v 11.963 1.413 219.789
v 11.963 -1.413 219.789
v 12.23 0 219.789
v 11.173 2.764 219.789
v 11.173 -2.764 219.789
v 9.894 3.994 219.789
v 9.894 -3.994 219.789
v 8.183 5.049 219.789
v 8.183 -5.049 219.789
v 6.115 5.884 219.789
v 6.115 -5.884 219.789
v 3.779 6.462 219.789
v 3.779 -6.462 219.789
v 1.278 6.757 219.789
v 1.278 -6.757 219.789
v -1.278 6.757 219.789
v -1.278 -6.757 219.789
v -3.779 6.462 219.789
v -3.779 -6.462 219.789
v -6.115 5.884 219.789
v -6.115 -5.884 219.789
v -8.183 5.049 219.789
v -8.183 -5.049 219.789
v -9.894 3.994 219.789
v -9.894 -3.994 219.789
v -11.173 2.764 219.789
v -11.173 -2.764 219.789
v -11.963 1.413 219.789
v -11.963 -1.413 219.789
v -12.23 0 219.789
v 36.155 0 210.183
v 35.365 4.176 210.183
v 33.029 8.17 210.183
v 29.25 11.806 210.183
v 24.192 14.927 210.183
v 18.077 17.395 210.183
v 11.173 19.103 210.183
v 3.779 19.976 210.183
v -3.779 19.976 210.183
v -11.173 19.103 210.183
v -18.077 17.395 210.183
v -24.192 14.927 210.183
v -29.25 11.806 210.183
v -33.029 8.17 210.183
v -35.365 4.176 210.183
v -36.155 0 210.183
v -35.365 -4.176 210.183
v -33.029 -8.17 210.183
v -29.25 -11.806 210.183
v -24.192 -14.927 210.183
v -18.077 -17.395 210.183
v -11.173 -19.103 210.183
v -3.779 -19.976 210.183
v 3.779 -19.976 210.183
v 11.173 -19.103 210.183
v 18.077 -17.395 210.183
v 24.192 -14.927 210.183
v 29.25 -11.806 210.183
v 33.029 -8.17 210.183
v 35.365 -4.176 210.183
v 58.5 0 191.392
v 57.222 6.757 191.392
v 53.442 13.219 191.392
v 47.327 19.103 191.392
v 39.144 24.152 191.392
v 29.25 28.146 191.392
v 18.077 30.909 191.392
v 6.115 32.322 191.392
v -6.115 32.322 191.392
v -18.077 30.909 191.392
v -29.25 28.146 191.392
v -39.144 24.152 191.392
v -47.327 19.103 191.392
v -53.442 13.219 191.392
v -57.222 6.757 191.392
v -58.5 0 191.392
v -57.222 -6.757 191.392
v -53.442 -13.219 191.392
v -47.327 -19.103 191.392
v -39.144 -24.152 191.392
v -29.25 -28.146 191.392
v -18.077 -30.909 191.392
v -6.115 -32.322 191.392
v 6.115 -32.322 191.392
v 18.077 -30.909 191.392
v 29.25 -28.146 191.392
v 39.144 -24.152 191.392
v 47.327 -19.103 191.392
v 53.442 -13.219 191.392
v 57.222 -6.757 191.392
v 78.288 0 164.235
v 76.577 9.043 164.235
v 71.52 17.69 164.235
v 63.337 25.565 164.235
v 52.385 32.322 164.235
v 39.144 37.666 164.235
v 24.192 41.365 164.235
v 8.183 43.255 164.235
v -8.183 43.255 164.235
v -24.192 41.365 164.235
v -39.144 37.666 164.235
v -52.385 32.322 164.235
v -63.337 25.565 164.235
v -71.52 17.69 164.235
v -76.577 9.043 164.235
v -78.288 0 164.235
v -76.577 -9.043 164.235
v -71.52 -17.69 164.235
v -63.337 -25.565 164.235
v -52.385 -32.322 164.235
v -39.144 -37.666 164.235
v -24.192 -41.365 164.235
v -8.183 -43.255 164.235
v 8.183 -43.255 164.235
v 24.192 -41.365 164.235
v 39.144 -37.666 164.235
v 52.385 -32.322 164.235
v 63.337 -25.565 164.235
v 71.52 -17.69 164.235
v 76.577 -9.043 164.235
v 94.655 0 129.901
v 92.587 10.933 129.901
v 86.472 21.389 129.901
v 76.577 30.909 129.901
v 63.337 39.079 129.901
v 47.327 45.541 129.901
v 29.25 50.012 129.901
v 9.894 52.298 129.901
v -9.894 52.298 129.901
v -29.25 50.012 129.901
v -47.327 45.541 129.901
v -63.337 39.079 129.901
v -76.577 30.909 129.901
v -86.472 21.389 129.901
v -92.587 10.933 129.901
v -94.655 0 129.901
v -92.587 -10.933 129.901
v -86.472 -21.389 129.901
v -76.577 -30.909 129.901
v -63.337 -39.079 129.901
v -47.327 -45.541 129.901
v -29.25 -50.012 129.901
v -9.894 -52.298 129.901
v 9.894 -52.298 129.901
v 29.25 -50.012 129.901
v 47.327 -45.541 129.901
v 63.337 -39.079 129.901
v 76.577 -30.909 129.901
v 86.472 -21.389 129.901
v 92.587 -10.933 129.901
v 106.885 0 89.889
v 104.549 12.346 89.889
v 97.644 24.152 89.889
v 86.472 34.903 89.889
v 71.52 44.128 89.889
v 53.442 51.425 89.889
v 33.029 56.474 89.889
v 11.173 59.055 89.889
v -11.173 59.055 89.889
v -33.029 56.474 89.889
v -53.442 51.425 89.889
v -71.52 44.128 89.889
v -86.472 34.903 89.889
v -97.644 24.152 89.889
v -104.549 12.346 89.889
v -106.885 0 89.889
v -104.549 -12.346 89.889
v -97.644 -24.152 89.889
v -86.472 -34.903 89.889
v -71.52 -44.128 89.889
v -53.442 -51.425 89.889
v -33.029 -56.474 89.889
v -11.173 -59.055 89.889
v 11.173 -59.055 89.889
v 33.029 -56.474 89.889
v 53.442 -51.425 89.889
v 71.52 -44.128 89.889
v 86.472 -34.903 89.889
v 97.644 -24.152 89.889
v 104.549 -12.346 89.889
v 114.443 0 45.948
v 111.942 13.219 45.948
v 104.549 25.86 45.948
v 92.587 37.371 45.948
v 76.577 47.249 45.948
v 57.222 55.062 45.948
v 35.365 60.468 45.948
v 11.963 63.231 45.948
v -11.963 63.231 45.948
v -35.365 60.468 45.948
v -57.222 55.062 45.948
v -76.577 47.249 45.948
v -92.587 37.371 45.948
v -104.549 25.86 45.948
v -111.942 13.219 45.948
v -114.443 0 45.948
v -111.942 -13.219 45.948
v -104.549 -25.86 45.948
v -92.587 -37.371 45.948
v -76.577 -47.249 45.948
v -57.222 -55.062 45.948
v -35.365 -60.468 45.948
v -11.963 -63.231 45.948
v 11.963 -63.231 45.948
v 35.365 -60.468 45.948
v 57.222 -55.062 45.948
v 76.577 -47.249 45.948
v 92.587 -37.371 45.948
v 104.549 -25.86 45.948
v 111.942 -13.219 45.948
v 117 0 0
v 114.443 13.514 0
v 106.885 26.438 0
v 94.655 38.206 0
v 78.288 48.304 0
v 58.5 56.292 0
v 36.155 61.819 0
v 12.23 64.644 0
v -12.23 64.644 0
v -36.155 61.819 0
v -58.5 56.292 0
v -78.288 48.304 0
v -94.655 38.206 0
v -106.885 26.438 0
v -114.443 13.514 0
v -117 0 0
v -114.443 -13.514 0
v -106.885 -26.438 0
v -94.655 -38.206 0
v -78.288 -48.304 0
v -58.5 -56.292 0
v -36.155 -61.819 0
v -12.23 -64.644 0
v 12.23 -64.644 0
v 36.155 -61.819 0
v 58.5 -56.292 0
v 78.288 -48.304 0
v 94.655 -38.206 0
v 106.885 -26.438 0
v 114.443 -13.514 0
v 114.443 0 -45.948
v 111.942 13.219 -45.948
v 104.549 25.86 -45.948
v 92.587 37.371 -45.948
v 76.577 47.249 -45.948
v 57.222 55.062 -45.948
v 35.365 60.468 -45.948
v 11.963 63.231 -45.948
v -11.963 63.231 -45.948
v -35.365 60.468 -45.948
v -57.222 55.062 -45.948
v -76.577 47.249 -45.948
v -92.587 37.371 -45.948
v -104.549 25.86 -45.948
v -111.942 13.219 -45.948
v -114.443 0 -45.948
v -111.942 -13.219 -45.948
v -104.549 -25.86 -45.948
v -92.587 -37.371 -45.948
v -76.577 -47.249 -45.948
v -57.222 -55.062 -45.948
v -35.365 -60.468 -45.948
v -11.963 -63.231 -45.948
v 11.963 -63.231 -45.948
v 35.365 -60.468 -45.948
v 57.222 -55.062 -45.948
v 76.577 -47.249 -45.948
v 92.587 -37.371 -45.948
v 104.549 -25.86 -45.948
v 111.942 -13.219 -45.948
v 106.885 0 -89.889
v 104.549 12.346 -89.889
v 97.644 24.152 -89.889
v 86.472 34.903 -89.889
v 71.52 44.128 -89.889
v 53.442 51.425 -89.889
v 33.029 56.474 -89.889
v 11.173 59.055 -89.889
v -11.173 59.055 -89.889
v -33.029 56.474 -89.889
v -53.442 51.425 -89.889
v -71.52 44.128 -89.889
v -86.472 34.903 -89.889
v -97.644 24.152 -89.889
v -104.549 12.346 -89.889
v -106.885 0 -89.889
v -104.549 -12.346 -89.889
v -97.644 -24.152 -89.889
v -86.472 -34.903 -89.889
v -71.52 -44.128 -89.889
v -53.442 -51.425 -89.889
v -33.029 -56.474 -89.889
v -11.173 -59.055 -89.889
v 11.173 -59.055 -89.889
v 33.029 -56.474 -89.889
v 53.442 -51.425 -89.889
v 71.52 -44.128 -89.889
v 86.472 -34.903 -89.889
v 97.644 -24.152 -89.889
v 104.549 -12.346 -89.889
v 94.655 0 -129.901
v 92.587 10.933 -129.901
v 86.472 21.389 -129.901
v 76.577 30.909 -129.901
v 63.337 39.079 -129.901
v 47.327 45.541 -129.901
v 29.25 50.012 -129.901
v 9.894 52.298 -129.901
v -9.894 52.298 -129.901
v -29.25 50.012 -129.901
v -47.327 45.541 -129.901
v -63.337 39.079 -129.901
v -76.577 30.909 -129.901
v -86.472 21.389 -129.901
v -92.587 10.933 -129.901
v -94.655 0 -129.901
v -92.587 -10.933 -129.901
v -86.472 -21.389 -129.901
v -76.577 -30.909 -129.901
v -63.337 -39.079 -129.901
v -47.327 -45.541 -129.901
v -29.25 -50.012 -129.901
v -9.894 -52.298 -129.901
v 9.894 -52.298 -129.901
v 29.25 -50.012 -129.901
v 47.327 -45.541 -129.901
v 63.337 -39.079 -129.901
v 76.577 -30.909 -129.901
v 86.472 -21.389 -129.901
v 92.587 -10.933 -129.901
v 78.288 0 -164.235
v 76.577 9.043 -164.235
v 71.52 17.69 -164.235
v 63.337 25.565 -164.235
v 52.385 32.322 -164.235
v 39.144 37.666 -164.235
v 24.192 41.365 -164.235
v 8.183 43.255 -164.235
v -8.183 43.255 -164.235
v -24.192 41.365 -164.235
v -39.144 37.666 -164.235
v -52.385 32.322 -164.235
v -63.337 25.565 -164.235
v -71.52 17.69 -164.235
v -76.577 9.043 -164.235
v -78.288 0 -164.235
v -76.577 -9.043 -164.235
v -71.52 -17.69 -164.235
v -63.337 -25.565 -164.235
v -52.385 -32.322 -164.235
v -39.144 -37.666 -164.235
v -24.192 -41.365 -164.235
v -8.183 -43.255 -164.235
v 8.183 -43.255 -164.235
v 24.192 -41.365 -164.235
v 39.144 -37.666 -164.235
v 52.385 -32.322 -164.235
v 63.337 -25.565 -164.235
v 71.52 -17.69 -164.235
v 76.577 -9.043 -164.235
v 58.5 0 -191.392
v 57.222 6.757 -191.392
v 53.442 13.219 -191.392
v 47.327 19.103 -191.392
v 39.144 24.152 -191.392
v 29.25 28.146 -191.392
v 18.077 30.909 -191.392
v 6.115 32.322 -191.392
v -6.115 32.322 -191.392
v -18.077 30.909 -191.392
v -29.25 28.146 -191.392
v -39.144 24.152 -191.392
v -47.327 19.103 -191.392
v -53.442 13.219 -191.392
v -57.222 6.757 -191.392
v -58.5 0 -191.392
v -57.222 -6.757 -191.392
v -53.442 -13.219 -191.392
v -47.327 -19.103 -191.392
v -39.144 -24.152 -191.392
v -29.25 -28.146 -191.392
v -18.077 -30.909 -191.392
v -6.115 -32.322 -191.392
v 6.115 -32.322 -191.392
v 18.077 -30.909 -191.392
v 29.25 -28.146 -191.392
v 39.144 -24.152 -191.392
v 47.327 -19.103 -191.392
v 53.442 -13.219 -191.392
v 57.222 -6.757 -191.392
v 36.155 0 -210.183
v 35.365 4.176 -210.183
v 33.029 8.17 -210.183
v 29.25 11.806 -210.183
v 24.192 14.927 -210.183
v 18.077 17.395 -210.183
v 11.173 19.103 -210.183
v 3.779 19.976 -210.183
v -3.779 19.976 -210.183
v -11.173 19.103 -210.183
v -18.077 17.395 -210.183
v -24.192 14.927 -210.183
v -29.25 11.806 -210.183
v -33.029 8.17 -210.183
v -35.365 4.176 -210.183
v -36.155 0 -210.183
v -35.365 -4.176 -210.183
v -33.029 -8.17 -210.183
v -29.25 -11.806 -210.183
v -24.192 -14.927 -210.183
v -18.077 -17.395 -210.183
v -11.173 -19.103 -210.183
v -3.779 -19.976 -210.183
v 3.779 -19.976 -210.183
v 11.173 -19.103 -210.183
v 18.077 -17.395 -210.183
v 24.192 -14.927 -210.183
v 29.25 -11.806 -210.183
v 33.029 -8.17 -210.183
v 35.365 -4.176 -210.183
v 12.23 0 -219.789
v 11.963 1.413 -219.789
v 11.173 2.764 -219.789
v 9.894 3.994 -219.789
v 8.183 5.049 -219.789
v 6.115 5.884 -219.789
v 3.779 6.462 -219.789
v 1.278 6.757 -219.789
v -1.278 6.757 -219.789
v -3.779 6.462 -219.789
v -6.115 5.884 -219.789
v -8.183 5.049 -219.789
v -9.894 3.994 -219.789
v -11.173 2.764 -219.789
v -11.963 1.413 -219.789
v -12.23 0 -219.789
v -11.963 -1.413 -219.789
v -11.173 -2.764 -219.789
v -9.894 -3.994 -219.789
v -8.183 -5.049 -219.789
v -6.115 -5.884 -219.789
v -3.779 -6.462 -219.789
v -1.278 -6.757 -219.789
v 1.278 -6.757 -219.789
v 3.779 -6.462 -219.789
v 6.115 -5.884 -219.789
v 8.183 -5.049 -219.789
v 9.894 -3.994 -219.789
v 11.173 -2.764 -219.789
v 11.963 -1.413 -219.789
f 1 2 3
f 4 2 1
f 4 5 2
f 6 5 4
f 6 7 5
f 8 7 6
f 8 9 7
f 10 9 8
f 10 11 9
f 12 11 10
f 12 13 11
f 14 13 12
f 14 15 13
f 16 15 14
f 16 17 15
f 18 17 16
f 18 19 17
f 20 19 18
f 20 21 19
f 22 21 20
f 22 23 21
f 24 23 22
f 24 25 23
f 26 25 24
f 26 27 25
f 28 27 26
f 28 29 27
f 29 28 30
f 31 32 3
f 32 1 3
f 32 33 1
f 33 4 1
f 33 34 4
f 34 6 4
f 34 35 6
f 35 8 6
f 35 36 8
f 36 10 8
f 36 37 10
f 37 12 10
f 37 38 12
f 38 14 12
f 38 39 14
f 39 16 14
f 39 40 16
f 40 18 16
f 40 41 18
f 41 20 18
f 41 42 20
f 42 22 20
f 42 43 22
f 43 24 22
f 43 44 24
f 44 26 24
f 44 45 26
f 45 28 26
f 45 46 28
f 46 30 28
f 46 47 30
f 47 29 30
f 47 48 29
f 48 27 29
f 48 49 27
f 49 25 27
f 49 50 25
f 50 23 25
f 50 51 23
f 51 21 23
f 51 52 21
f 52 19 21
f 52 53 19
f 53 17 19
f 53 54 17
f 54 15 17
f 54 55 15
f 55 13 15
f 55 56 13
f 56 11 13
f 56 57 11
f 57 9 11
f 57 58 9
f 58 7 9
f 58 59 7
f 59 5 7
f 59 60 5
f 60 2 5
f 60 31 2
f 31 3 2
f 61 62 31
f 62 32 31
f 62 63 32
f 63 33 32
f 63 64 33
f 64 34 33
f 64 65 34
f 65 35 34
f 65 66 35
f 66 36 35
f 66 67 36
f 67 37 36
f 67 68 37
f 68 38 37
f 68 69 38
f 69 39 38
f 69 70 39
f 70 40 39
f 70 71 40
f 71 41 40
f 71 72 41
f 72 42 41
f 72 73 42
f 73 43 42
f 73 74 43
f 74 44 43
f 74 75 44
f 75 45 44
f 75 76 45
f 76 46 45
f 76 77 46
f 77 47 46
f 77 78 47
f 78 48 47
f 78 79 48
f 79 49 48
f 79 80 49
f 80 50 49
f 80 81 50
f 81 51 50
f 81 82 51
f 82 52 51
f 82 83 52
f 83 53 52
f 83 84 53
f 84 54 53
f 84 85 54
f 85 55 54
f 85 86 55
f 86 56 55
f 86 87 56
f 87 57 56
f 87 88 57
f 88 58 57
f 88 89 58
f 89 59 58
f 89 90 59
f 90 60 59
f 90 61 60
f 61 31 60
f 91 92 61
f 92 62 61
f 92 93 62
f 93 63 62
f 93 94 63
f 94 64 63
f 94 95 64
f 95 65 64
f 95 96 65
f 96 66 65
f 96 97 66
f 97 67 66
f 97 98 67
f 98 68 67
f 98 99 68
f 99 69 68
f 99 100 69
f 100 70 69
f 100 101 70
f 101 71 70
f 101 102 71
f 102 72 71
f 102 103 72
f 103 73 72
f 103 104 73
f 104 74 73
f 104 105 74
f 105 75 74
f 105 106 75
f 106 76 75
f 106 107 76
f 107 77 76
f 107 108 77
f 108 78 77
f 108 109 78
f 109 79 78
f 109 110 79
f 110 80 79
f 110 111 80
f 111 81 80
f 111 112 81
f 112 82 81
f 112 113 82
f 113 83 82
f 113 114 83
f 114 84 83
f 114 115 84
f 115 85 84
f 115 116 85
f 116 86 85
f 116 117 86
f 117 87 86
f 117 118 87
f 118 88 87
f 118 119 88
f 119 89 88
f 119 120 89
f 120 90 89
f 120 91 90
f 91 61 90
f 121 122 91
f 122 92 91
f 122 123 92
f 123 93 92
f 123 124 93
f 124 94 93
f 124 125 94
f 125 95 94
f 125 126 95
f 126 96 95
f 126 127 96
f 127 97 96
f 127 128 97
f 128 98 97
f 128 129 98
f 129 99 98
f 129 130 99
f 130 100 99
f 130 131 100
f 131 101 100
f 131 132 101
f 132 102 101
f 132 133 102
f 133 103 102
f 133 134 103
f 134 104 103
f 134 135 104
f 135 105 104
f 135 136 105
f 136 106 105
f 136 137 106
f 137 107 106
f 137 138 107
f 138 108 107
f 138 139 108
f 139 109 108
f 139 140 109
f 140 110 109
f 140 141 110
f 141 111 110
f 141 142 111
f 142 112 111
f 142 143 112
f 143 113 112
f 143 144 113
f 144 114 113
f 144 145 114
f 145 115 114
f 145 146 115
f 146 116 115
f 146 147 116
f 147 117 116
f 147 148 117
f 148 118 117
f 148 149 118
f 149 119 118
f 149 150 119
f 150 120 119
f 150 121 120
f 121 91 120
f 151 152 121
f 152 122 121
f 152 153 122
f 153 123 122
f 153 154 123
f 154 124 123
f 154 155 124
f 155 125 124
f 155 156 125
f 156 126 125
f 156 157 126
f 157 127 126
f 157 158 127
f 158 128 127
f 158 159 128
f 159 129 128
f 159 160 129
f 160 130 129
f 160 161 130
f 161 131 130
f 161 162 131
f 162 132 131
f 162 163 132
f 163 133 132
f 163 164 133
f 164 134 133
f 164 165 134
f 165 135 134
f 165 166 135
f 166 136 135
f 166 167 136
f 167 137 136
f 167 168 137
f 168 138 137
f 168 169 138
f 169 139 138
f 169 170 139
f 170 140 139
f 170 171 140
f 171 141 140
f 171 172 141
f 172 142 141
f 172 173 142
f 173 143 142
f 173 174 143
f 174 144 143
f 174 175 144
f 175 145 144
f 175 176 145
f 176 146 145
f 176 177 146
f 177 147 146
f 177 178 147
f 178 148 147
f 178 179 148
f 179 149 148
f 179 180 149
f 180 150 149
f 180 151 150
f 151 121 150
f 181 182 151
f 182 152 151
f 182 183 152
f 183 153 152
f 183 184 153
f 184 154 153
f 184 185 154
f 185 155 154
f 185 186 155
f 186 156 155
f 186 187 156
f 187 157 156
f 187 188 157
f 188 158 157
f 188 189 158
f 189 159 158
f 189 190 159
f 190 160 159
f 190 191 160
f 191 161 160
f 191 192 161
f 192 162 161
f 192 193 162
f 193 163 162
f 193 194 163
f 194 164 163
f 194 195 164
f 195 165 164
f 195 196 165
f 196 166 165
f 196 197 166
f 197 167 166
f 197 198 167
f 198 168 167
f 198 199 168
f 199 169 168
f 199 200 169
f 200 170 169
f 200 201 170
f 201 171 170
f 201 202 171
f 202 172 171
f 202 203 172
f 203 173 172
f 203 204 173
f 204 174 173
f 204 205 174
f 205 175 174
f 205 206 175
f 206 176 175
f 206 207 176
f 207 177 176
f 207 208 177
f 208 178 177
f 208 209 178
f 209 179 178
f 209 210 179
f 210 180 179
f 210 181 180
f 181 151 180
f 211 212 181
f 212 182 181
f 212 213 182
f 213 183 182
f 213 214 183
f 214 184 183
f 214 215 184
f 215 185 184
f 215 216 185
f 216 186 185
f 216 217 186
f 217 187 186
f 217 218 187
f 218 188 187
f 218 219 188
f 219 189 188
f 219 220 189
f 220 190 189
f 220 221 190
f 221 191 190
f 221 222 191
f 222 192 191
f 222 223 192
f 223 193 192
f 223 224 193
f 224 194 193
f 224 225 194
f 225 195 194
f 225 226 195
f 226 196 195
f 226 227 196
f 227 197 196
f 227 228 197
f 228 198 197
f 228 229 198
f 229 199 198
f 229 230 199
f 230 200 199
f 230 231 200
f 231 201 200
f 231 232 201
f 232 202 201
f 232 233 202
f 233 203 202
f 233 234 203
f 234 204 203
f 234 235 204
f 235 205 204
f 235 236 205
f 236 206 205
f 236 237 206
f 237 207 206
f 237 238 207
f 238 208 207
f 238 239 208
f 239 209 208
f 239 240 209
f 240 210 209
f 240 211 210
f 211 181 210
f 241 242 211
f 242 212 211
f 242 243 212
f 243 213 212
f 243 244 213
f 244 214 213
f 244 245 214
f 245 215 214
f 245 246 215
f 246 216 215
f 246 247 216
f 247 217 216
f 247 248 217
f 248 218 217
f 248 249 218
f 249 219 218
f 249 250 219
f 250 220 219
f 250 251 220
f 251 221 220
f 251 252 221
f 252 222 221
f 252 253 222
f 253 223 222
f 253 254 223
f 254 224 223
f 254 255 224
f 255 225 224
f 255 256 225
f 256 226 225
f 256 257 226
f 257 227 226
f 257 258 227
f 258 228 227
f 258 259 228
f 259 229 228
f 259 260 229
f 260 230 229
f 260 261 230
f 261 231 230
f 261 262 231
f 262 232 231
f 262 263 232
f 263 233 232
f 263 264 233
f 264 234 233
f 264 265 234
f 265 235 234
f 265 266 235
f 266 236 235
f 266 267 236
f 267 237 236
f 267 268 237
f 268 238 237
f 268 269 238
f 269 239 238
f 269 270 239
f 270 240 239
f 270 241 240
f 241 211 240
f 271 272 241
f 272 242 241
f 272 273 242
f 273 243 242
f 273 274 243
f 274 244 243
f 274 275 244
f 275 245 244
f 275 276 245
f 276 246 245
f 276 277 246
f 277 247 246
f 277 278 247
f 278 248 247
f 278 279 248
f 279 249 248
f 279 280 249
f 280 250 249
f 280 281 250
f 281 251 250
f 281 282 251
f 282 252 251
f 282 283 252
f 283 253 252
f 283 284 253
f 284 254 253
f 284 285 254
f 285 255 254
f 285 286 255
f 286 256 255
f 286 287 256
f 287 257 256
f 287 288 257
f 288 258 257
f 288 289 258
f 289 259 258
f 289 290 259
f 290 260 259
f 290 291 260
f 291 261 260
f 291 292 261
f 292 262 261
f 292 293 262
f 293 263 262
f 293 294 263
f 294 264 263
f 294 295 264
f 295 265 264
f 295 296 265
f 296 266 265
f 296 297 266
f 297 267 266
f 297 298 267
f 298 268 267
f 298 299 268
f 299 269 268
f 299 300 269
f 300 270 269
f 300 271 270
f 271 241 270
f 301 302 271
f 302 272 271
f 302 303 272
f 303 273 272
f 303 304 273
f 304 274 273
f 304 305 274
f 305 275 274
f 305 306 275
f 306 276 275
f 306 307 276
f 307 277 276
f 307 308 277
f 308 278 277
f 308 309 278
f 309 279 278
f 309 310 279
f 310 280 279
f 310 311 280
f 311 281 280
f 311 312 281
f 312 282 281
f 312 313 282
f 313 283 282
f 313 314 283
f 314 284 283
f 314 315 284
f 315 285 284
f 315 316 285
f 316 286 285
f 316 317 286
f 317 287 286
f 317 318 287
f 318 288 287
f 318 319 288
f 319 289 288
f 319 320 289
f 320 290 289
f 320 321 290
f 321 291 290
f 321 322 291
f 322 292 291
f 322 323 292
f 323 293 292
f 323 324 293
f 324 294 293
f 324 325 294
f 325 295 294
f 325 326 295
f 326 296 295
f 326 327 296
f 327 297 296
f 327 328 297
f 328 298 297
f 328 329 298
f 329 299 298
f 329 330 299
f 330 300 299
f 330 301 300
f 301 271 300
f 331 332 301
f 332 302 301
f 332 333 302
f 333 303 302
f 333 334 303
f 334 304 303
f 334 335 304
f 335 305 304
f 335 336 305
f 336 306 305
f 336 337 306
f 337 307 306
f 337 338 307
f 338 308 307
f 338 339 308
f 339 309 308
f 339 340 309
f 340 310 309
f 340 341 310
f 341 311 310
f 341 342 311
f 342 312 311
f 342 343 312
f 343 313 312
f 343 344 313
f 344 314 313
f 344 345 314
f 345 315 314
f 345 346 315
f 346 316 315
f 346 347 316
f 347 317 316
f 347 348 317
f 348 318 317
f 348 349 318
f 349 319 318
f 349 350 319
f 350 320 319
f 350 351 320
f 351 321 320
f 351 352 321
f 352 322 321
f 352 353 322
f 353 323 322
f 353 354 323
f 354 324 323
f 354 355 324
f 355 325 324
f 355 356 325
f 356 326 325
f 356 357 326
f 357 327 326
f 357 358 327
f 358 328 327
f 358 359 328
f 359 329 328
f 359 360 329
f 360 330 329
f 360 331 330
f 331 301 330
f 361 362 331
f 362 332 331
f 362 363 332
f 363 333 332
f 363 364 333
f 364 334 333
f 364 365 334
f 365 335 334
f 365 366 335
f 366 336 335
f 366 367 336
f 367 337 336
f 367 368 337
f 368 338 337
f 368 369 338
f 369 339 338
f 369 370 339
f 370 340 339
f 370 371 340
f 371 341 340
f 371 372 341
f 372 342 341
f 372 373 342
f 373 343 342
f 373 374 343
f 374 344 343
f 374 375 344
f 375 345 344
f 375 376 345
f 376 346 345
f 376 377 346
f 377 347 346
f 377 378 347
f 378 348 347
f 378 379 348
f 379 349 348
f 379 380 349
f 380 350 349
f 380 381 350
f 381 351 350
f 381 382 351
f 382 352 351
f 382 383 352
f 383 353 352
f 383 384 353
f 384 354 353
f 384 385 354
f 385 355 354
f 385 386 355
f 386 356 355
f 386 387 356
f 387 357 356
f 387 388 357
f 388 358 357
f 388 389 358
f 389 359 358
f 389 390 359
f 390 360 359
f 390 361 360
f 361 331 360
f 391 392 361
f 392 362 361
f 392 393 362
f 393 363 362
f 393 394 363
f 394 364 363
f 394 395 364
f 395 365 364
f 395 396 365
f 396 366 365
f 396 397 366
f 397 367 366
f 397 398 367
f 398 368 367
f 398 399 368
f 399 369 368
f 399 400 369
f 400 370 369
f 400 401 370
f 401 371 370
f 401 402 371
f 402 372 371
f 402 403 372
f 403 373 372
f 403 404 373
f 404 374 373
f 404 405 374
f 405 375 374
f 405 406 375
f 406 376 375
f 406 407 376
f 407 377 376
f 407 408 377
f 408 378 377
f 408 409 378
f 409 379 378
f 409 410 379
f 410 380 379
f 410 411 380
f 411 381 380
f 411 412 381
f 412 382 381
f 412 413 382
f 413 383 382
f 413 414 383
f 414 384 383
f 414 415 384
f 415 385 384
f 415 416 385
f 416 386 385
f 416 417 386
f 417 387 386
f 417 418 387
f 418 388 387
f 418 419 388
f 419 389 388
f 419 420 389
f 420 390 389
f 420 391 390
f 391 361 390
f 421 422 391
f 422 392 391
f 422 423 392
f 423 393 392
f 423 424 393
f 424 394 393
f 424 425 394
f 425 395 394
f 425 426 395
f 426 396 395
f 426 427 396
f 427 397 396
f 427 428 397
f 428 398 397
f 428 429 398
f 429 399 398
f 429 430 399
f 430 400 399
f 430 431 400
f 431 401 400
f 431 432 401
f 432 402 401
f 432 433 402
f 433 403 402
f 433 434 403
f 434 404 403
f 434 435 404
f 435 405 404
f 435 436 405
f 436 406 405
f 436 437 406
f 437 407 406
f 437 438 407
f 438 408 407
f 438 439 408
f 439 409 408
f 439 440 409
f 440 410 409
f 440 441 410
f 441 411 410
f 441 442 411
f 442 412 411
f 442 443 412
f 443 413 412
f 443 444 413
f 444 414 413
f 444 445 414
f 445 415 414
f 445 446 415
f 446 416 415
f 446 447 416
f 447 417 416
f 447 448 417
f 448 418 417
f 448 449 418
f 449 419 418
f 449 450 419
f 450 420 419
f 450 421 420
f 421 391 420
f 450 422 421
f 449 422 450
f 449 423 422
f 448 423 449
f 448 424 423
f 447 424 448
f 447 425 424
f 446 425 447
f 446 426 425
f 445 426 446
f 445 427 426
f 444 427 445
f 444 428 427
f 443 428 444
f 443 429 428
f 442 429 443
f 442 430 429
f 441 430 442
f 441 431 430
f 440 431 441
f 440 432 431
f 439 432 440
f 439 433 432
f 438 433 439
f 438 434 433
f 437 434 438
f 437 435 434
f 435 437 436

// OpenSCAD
// Generated by SolidPython 1.0.1 on 2020-07-29 00:46:48


scale(v = [9, 5, 17]) {
	sphere(r = 13);
}
/***********************************************
*********      SolidPython code:      **********
************************************************
 
# import packages: SolidPython
from solid import *
from solid.utils import *
from itertools import chain, combinations, permutations


class Resize:

    def __init__(self, scad_file):
        self.scad_file = scad_file
        #self.scad_file = import_scad(scad_file)
        # cone/cylinder param:
        self.r1 = 0
        self.r2 = 0
        self.h = 0
        # rectangular prism param:
        self.w = 0
        self.l = 0
        # ellipse param:
        self.r = 0

    # import OpenScad code (file name corresponds to shape)


    # classify shape + parameters
    def assign(self, param1, param2, param3):
        if self.scad_file == 'cone.scad':
            self.r1 = param1
            self.r2 = param2
            self.h = param3
        elif self.scad_file == 'cylinder.scad':
            self.r1 = param1
            self.r2 = param2
            self.h = param3
        elif self.scad_file == 'rectangularPrism.scad':
            self.h = param1
            self.l = param2
            self.w = param3
        else:
            self.r = param1
            self.h = param2

    # resize parameters
    def iterate(self):
        x = range(3, 20, 2)
        i = 1
        if self.scad_file == 'cone.scad':
            tempList = list(permutations(x, 2))
            for temp in tempList:
                param1 = temp[0]
                param2 = temp[1]
                filepath = 'produced_scad_files/' + 'cone' + str(param1) + '_' + str(param2) + '_' + '.scad'
                scad_render_to_file(cylinder(h=param1, r1=param2, r2=0), filepath)

        elif self.scad_file == 'cylinder.scad':
            tempList = list(permutations(x, 3))
            for temp in tempList:
                param1 = temp[0]
                param2 = temp[1]
                filepath = 'produced_scad_files/' + 'cylinder' + str(param1) + '_' + str(param2) + '_' + '.scad'
                scad_render_to_file(cylinder(h=param1, r1=param2, r2=param2), filepath)

        elif self.scad_file == 'rectangularPrism.scad':
            tempList = list(permutations(x, 3))
            for temp in tempList:
                param1 = temp[0]
                param2 = temp[1]
                param3 = temp[2]
                filepath = 'produced_scad_files/' + 'rectangularPrism' + str(param1) + '_' + str(param2) + '_' + str(
                    param3) + '.scad'
                scad_render_to_file(cube(size=(param1, param2, param3)), filepath)

        elif self.scad_file == 'ellipse.scad':
            tempList = list(permutations(x, 4))
            for temp in tempList:
                param1 = temp[0]
                param2 = temp[1]
                param3 = temp[2]
                param4 = temp[3]
                filepath = 'produced_scad_files/' + 'ellipse' + str(param1) + '_' + str(param2) + '_' + str(param3) + '_' + str(param4) + '.scad'
                scad_render_to_file(scale([param1, param2, param3])(sphere(r=param4)), filepath)

    def render_to_scadfile(self):
        scad_render_to_file(scad, 'example.scad') 
 
************************************************/
